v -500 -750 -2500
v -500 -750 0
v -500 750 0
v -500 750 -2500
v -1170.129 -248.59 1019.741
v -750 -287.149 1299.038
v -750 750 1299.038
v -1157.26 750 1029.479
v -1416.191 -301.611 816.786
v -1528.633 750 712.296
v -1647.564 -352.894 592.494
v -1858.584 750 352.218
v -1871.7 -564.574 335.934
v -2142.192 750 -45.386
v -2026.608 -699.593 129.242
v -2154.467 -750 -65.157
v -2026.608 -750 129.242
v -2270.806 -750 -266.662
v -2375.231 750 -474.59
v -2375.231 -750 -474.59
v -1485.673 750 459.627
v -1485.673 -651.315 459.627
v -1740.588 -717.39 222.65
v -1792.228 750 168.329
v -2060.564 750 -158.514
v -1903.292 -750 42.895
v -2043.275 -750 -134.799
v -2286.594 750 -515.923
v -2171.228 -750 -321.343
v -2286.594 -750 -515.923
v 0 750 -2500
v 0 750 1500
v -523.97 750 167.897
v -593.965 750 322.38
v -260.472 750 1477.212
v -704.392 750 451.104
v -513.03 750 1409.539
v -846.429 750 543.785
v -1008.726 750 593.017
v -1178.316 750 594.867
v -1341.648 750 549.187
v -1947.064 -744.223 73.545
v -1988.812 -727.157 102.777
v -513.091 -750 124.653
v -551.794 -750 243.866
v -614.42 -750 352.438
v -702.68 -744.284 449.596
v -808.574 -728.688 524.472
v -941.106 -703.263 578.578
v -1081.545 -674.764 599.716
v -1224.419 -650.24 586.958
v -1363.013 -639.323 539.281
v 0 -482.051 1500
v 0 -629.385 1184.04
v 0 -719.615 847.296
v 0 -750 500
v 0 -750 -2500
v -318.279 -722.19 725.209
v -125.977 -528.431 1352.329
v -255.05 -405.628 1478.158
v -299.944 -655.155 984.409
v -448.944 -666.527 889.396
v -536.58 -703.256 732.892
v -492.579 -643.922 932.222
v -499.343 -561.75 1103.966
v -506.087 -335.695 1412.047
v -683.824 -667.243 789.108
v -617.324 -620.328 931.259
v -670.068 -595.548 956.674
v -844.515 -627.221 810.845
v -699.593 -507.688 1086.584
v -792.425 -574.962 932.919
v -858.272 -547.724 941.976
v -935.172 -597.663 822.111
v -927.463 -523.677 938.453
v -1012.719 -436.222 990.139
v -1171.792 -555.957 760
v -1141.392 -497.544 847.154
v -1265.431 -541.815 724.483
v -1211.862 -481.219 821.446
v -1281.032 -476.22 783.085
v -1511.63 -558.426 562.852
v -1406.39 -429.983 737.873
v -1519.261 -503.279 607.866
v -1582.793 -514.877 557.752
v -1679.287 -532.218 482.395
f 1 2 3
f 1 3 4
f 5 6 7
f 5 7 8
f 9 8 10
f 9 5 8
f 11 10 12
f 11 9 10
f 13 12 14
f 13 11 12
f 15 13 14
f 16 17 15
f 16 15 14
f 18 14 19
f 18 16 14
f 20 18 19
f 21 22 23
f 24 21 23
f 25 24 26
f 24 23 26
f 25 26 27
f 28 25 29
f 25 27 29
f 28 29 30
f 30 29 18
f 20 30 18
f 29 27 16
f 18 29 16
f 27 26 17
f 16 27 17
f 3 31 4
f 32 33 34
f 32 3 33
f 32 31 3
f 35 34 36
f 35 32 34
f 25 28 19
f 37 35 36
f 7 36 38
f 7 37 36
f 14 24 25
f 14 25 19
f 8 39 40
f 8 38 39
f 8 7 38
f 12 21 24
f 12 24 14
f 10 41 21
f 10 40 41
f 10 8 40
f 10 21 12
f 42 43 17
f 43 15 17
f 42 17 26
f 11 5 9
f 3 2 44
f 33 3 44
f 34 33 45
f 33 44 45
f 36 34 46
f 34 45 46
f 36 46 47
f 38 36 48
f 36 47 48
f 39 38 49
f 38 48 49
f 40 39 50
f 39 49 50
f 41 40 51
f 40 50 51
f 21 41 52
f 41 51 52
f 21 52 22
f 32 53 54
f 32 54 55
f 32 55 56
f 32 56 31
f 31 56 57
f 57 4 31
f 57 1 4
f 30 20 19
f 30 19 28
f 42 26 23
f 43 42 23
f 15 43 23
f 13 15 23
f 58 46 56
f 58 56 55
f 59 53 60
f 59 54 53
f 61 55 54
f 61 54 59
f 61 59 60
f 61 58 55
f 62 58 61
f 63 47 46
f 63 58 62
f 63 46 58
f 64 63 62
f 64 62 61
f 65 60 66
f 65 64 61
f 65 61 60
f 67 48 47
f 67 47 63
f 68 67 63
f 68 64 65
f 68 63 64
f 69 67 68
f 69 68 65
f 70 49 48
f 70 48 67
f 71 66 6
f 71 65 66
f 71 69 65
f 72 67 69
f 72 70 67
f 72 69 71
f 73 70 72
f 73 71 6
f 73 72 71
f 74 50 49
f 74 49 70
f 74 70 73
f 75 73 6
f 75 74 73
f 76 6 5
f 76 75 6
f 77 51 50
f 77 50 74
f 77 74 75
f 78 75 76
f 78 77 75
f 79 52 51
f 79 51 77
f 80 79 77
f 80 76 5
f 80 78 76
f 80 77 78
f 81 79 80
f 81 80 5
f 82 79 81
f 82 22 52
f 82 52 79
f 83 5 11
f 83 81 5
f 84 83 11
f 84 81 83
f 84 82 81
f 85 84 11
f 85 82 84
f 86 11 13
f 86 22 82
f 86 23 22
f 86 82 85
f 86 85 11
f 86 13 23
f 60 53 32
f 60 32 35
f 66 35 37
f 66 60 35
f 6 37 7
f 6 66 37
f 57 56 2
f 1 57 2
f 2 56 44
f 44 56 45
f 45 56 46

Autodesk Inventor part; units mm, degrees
ref_plane "YZ Plane" through (0, 0, 0) normal (1, 0, 0) x (0, 1, 0)
sketch "Sketch1" plane through (0, 0, 0) normal (0, 1, 0) x (-1, 0, 0)
  arc A0 (1485.6726, 459.6267) -> (500, 0) centre (1100, 0) ccw
  arc A1 (750, 1299.0381) -> (0, 1500) centre (0, 0) ccw
  line L0 (0, 1500) -> (0, -2500)
  line L1 (0, 0) -> (500, 0) construction
  line L2 (0, 0) -> (4307.852, 0) construction
  arc A2 (2375.2311, -474.5905) -> (750, 1299.0381) centre (-1250, -2165.0635) ccw
  line L3 (0, 0) -> (750, 1299.0381) construction
  line L4 (2533.8122, -814.6686) -> (2153.926, 0) construction
  line L5 (500, 0) -> (500, -2500)
  line L6 (1100, 0) -> (1485.6726, 459.6267) construction
  arc A3 (2286.5935, -515.9229) -> (1485.6726, 459.6267) centre (-716.704, -2165.0635) ccw
  line L7 (2375.2311, -474.5905) -> (2286.5935, -515.9229)
  line L8 (-1250, -2165.0635) -> (1570, -2165.0635) construction
  line L9 (500, -2500) -> (0, -2500)
  dimension "d0" = 1200
  dimension "d1" = 3000
  dimension "d3" = 500
  dimension "d4" = 4000
  dimension "d5" = 30
  dimension "d6" = 25
  dimension "d7" = 40
  dimension "d9" = 3426.2897
  dimension "d10" = 2500
extrude "Extrusion1" add sketch "Sketch1" along normal mid plane 1500
sketch "Sketch3" plane through (0, -750, 0) normal (0, -1, 0) x (1, 0, 0)
  line L0 (0, -1289.8041) -> (-2443.3584, 421.0539) construction
  arc A0 (-750, 1299.0381) -> (-2375.2311, -474.5905) centre (1250, -2165.0635) ccw construction
  line L1 (0, -2500) -> (0, 1500) projected
  point P0 (0, 0)
  dimension "d15" = 55
sketch "Sketch2" plane through (0, -750, -2500) normal (1, 0, 0) x (0, 0, -1)
  line L0 (0, 0) -> (0, 1500) construction
  line L1 (-4000, 1500) -> (0, 1500) construction
  line L2 (-4000, 1500) -> (-4000, 0) construction
  line L3 (0, 0) -> (-4000, 0) construction
  line L4 (-3000, 0) -> (-3000, 1500) construction
  line L5 (0, 0) -> (-4000, 0) projected
  arc A0 (-4566.8639, 757.0449) -> (-3000, 0) centre (-3000, 2000) ccw
  line L6 (-3000, 0) -> (-3000, -688)
  line L7 (-3000, -688) -> (-5471, 267.9492)
  line L8 (-5471, 267.9492) -> (-4566.8639, 757.0449)
  point P0 (-2500, 750)
  dimension "d13" = 1000
  dimension "d14" = 4000
ref_plane "Work Plane2" through (0, 750, -915) normal (-0.7071, 0, -0.7071) x (0, -1, 0)
sketch "Sketch4" plane through (0, -750, -2500) normal (1, 0, 0) x (0, 0, -1)
  line L0 (0, 0) -> (-4000, 0) projected
  line L1 (-4000, 0) -> (-4000, 1500) projected
  line L2 (-4000, 1500) -> (0, 1500) projected
  line L3 (0, 1500) -> (0, 0) projected
  line L4 (0, 0) -> (-4000, 0) projected
  line L5 (-4000, 0) -> (-4000, 1500) projected
  line L6 (-4000, 1500) -> (0, 1500) projected
  line L7 (0, 1500) -> (0, 0) projected
  line L8 (-1210.1959, 0) -> (-2921.0539, 0) construction
  line L9 (0, 0) -> (-4000, 0) projected
  line L10 (-1210.1959, 0) -> (-1210.1959, 1500) construction
  point P0 (-2500, 750)
ref_plane "Work Plane3" through (0, 750, -1289.8041) normal (-0.5736, 0, -0.8192) x (0, -1, 0)
sketch "Sketch7" plane through (0, 750, -1289.8041) normal (-0.5736, 0, -0.8192) x (0, -1, 0)
  arc A0 (1500, 2323.4905) -> (1202.693, 2568.9738) centre (1250, 2323.4905) ccw
  line L0 (1500, 0) -> (1500, 2982.7898) construction
  line L1 (1500, 2474.0318) -> (1500, 2323.4905) construction
  line L2 (1500, 2323.4905) -> (0, 2323.4905) construction
  line L3 (0, 2323.4905) -> (0, 2474.0318) construction
  line L4 (0, 2474.0318) -> (1500, 2474.0318) construction
  line L5 (1500, 610.3873) -> (1500, 0) construction
  line L6 (1500, 0) -> (0, 0) construction
  line L7 (0, 0) -> (0, 610.3873) construction
  line L8 (0, 610.3873) -> (1500, 610.3873) construction
  line L9 (1202.693, 2568.9738) -> (1046, 3413)
  line L10 (1046, 3413) -> (2457, 2027)
  line L11 (2457, 2027) -> (1500, 2323.4905)
  point P0 (750, 739.8012)
  dimension "d34" = 500
loft "Loft5" cut profiles "Sketch2", "Sketch7"
properties part number "main_front"
